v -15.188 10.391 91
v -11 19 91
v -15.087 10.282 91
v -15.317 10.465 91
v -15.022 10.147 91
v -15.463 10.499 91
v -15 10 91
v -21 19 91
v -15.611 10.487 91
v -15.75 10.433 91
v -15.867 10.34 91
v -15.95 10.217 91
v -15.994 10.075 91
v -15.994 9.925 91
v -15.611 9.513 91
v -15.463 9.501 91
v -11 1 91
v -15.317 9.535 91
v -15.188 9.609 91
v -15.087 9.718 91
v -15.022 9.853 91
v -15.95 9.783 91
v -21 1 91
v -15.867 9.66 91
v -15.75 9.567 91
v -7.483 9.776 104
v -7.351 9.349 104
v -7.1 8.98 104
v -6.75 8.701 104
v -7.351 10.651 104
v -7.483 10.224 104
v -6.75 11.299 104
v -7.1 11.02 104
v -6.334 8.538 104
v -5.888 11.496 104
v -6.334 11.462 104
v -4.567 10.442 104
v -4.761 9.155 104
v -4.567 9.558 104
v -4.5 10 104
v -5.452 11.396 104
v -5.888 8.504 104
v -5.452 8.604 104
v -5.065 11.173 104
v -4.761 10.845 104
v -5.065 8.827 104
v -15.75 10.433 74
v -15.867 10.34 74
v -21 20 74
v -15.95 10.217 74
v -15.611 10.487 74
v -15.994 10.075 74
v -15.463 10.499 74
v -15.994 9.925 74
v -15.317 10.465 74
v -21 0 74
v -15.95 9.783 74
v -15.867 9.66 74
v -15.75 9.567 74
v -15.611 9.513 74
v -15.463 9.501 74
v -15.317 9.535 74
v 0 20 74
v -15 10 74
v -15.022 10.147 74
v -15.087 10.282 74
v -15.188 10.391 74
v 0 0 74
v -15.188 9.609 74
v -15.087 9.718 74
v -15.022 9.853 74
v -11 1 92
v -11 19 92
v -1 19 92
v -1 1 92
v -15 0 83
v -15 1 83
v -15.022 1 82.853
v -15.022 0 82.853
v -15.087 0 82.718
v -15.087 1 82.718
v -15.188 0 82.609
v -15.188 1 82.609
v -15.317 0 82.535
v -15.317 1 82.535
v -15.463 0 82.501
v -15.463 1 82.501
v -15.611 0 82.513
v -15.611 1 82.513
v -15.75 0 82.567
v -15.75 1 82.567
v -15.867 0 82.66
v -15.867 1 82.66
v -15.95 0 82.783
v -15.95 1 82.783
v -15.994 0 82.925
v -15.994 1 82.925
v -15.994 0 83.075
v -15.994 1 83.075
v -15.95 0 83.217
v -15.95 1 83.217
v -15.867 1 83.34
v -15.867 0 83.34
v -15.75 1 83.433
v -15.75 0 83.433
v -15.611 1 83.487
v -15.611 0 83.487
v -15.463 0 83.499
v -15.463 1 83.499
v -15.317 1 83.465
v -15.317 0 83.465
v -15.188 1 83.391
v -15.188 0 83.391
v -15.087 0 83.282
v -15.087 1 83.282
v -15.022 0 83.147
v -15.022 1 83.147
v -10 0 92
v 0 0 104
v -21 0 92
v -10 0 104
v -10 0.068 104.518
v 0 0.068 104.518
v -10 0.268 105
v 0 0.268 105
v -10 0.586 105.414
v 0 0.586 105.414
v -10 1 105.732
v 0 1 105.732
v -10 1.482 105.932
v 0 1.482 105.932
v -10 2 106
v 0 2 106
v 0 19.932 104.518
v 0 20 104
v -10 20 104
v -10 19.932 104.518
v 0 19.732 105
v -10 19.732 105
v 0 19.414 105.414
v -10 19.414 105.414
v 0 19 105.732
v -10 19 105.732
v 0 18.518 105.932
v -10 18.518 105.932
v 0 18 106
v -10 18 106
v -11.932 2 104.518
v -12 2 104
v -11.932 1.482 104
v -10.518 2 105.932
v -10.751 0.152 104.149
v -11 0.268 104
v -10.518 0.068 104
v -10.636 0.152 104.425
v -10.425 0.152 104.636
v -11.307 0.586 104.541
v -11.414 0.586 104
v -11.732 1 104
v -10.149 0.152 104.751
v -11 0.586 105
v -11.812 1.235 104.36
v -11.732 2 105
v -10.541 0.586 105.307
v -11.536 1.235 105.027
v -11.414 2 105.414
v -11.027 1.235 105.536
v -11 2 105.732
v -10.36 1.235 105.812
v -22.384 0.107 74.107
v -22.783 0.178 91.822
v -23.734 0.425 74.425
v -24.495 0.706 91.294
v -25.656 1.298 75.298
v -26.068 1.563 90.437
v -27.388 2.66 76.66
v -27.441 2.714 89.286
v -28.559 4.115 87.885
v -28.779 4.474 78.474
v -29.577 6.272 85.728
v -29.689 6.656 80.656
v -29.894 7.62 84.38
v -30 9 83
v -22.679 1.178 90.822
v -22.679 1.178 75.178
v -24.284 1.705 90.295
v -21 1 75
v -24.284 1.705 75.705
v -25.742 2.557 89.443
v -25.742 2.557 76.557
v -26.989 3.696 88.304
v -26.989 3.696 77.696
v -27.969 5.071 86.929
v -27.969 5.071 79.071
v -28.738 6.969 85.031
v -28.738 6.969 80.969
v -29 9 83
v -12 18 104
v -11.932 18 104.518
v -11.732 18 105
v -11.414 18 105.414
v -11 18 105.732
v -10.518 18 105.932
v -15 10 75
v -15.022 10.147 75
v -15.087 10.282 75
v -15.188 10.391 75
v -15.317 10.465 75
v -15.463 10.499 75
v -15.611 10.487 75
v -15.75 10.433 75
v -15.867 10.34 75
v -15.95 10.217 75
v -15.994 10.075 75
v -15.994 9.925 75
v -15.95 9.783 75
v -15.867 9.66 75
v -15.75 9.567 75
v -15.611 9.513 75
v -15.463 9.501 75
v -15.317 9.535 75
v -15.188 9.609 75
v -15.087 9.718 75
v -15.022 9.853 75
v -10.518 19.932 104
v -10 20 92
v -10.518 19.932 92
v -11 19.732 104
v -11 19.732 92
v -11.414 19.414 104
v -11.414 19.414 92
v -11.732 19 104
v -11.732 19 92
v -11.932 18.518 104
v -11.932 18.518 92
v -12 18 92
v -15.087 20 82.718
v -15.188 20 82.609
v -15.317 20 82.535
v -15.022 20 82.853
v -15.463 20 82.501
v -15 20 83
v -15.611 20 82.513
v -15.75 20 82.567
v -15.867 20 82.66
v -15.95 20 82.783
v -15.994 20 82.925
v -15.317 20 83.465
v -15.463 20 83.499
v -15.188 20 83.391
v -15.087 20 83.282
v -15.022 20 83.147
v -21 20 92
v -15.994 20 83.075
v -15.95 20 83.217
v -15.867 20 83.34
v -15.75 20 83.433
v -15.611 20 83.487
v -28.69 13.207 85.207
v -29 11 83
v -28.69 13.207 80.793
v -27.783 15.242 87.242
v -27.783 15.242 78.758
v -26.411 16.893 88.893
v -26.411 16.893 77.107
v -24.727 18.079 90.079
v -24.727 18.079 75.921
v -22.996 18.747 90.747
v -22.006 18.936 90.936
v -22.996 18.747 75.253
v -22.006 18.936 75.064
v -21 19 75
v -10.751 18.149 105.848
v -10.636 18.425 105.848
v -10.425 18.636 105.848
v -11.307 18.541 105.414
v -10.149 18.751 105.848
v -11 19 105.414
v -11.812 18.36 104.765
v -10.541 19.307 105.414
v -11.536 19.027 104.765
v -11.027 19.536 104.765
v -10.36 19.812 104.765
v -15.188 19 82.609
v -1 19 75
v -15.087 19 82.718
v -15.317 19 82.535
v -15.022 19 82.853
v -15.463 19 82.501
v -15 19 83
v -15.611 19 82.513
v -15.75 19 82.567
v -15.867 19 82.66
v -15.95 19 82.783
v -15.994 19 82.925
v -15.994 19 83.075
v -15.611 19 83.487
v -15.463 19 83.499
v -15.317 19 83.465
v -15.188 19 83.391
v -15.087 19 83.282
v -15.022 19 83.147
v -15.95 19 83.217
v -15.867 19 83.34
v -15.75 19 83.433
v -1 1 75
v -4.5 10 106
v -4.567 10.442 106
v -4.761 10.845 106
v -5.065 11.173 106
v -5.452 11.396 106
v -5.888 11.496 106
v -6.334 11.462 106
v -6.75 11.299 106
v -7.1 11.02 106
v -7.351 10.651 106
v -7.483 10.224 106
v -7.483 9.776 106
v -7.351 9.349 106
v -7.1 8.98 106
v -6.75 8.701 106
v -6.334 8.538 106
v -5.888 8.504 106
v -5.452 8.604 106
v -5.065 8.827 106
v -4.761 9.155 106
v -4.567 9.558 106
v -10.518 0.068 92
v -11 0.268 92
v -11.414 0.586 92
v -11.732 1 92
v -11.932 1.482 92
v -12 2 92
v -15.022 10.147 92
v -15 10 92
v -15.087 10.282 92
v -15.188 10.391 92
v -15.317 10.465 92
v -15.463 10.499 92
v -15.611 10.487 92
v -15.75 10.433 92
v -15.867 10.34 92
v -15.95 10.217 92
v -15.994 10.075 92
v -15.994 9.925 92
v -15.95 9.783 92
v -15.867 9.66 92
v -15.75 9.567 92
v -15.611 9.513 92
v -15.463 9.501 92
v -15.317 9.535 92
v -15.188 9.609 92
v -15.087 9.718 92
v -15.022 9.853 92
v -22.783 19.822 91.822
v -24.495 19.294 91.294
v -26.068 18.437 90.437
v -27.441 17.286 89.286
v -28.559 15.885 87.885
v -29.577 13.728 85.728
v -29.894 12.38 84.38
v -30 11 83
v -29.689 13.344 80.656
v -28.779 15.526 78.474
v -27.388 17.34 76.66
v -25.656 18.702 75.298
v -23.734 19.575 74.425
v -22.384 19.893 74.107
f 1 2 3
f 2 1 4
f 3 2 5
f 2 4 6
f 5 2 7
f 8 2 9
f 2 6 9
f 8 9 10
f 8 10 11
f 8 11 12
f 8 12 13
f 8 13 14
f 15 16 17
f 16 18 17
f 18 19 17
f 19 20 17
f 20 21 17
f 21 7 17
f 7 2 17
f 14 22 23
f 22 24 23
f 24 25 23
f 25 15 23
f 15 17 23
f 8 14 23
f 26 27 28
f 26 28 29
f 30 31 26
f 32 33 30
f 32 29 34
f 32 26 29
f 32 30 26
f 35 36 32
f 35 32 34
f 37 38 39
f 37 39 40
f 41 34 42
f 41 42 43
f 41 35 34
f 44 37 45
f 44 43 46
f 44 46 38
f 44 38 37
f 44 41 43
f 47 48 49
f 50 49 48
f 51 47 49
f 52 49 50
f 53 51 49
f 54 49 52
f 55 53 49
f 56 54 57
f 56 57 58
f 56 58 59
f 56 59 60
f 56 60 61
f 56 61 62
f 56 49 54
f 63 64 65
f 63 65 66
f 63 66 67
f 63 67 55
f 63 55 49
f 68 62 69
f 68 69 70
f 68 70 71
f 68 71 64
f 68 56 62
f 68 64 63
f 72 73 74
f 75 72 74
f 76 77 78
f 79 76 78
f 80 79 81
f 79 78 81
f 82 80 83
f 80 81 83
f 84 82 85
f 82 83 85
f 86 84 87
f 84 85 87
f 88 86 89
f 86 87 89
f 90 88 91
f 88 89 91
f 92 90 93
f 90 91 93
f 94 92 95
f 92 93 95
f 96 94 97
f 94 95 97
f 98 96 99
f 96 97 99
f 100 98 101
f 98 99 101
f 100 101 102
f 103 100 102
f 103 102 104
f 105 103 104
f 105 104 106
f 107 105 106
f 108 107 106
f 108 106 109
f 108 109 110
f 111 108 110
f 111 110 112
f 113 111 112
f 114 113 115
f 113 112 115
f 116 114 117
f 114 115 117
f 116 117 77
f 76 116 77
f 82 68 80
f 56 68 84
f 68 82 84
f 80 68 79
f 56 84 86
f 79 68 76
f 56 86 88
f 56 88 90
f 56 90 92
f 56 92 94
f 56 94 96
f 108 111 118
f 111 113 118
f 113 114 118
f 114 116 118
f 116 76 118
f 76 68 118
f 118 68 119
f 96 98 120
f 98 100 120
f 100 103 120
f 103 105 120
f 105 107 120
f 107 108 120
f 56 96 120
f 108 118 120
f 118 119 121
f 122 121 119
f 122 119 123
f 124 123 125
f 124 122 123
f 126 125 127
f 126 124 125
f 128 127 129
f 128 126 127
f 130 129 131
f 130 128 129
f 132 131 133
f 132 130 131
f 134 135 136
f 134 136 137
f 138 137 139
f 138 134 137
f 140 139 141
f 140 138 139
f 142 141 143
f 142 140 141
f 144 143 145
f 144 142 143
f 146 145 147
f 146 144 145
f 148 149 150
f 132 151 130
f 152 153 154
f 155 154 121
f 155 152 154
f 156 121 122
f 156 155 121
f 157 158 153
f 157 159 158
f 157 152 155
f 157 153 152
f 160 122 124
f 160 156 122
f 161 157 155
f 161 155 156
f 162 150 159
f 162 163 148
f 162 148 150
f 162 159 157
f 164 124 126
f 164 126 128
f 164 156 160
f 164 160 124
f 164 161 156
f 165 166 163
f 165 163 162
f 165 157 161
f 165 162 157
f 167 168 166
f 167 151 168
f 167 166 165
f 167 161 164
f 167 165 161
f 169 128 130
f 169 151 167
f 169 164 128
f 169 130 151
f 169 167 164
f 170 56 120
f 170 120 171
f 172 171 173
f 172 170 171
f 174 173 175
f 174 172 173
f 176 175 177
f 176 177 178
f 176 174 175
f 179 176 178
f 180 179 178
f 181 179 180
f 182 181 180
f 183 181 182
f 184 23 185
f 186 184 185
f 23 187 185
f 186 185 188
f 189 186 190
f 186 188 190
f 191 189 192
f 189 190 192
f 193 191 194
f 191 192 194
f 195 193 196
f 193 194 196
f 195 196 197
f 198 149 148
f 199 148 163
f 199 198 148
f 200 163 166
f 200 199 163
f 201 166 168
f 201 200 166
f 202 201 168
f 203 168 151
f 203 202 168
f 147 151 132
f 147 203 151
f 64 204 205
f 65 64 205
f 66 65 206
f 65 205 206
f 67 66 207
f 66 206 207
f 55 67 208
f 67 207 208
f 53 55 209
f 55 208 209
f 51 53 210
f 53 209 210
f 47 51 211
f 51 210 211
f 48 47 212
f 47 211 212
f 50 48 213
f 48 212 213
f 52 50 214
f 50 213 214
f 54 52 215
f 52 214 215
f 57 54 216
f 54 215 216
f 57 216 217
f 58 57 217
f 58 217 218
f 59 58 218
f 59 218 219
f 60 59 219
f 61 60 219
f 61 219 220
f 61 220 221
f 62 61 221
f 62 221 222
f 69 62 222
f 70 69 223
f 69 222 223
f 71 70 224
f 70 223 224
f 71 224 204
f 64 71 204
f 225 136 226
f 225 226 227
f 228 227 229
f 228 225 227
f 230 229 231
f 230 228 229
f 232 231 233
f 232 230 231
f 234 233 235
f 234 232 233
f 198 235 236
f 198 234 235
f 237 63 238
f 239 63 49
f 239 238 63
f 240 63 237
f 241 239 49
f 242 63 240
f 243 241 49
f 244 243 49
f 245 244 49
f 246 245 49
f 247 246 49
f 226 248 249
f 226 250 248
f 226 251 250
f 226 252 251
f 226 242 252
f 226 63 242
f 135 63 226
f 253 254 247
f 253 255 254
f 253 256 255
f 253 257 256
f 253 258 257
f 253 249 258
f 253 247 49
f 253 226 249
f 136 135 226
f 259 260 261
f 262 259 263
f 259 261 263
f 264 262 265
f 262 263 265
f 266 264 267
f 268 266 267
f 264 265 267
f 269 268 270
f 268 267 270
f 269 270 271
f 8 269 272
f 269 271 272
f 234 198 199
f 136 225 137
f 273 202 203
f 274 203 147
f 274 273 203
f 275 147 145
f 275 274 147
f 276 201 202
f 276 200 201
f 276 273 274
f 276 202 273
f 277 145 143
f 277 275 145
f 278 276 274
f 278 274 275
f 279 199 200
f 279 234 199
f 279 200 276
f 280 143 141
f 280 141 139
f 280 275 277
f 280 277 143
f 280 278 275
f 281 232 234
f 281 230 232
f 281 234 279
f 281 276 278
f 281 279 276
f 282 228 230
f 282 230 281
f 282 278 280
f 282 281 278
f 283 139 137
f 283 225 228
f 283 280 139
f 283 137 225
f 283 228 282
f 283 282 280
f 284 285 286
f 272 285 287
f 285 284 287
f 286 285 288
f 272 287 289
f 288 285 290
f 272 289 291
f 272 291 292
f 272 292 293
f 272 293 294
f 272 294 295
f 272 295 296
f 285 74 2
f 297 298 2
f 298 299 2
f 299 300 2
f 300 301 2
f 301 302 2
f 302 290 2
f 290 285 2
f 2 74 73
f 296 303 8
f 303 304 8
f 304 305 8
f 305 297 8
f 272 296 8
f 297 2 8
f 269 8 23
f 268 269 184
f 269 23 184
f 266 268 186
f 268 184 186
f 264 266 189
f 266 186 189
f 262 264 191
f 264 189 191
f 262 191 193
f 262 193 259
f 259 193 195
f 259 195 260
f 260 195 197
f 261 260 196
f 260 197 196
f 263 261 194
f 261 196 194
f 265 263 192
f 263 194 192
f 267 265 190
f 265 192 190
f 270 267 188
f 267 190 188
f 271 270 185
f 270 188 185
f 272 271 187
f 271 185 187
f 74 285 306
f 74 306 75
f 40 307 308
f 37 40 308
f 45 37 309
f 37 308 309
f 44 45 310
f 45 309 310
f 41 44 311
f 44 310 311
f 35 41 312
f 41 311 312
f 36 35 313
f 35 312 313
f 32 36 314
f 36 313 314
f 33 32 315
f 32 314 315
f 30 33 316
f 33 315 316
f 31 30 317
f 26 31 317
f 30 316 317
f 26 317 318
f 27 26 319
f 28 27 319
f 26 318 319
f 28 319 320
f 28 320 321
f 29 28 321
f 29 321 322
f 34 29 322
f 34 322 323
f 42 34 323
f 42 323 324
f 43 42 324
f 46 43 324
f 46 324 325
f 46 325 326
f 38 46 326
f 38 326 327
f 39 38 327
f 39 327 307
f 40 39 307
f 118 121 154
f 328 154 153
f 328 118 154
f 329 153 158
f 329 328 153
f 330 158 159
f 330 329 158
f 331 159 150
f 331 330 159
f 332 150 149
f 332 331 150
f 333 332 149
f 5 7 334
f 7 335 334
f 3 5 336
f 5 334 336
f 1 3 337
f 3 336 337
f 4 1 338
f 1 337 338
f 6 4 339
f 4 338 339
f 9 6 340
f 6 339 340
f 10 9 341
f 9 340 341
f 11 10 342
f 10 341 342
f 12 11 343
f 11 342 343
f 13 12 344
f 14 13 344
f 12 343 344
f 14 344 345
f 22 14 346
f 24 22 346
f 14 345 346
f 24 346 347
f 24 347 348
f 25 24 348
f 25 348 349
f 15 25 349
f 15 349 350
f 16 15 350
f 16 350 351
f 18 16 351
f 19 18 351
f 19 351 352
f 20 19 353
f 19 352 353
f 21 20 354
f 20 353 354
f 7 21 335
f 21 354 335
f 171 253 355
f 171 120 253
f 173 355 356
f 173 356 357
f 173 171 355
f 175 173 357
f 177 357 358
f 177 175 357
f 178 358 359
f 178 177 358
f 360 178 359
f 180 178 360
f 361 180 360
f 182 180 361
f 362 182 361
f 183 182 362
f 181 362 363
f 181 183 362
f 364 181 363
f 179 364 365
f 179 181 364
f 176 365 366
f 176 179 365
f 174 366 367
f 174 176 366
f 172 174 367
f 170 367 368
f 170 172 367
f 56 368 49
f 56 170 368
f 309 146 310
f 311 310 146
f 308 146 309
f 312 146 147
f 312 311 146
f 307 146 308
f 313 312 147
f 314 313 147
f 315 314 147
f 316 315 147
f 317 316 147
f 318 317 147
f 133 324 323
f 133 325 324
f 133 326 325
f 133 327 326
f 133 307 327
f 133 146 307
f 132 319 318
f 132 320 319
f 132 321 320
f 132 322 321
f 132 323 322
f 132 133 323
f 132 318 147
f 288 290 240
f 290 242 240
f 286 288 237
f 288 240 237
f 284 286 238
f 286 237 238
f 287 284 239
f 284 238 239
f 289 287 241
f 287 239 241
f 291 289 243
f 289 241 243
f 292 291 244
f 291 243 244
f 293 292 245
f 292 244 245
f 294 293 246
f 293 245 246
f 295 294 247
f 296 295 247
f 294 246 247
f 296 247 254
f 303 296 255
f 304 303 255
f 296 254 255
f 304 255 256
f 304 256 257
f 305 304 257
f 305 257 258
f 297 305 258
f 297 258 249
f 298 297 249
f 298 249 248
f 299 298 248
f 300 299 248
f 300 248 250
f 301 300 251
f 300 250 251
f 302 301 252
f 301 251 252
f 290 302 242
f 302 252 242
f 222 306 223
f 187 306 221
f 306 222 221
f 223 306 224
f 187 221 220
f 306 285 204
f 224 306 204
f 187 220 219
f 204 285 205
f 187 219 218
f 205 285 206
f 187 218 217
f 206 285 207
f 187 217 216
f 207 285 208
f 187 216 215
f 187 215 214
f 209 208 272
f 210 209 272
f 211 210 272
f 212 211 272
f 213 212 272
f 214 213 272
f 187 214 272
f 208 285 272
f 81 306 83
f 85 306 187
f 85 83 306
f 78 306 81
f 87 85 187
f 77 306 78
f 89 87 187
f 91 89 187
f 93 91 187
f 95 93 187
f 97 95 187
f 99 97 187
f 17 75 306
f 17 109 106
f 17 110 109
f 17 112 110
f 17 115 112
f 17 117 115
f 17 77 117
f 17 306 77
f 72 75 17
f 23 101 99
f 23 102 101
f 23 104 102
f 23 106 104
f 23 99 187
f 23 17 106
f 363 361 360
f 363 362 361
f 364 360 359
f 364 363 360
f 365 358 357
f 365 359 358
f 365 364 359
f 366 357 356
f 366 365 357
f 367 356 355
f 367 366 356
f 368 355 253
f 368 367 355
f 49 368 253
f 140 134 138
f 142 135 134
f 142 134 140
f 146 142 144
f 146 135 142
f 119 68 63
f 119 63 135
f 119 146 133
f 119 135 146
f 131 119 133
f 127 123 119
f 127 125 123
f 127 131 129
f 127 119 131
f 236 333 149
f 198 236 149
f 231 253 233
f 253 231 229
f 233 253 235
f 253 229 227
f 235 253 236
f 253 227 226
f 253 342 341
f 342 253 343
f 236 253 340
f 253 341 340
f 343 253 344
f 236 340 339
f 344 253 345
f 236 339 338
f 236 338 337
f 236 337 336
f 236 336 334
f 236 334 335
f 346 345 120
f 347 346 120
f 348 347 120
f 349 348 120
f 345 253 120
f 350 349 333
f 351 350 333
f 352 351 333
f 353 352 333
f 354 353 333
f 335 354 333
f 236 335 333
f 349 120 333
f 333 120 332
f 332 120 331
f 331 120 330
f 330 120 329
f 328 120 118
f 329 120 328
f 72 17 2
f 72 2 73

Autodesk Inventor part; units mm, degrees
ref_plane "YZ Plane" through (0, 0, 0) normal (1, 0, 0) x (0, 1, 0)
sketch "Sketch1" plane through (0, 0, 0) normal (0, 1, 0) x (-1, 0, 0)
  line L0 (0, -106) -> (0, 94)
  line L1 (0, -106) -> (21, -106) construction
  line L2 (30, -97) -> (30, -97) construction
  line L3 (0, -106) -> (12, -106) construction
  line L4 (21, -88) -> (12, -88) construction
  line L5 (12, -88) -> (12, -86)
  line L6 (12, -106) -> (21, -106)
  line L7 (30, -88) -> (21, -88) construction
  line L8 (30, -88) -> (30, -106) construction
  arc A0 (21, -106) -> (30, -97) centre (21, -97) ccw
  arc A1 (30, -97) -> (21, -88) centre (21, -97) ccw
  line L9 (21, -106) -> (30, -106) construction
  line L10 (21, -88) -> (12, -88)
  line L11 (12, -68) -> (12, -66)
  arc A2 (21, -86) -> (30, -77) centre (21, -77) ccw
  arc A3 (30, -77) -> (21, -68) centre (21, -77) ccw
  line L12 (0, -86) -> (21, -86) construction
  line L13 (21, -68) -> (12, -68) construction
  line L14 (21, -68) -> (12, -68)
  line L15 (12, -86) -> (21, -86)
  line L16 (12, -48) -> (12, -46)
  arc A4 (21, -66) -> (30, -57) centre (21, -57) ccw
  arc A5 (30, -57) -> (21, -48) centre (21, -57) ccw
  line L17 (0, -66) -> (21, -66) construction
  line L18 (21, -48) -> (12, -48) construction
  line L19 (21, -48) -> (12, -48)
  line L20 (12, -66) -> (21, -66)
  line L21 (12, -28) -> (12, -26)
  arc A6 (21, -46) -> (30, -37) centre (21, -37) ccw
  arc A7 (30, -37) -> (21, -28) centre (21, -37) ccw
  line L22 (0, -46) -> (21, -46) construction
  line L23 (21, -28) -> (12, -28) construction
  line L24 (21, -28) -> (12, -28)
  line L25 (12, -46) -> (21, -46)
  line L26 (12, -8) -> (12, -6)
  arc A8 (21, -26) -> (30, -17) centre (21, -17) ccw
  arc A9 (30, -17) -> (21, -8) centre (21, -17) ccw
  line L27 (0, -26) -> (21, -26) construction
  line L28 (21, -8) -> (12, -8) construction
  line L29 (21, -8) -> (12, -8)
  line L30 (12, -26) -> (21, -26)
  line L31 (12, 12) -> (12, 14)
  arc A10 (21, -6) -> (30, 3) centre (21, 3) ccw
  arc A11 (30, 3) -> (21, 12) centre (21, 3) ccw
  line L32 (0, -6) -> (21, -6) construction
  line L33 (21, 12) -> (12, 12) construction
  line L34 (21, 12) -> (12, 12)
  line L35 (12, -6) -> (21, -6)
  line L36 (12, 32) -> (12, 34)
  arc A12 (21, 14) -> (30, 23) centre (21, 23) ccw
  arc A13 (30, 23) -> (21, 32) centre (21, 23) ccw
  line L37 (0, 14) -> (21, 14) construction
  line L38 (21, 32) -> (12, 32) construction
  line L39 (21, 32) -> (12, 32)
  line L40 (12, 14) -> (21, 14)
  line L41 (12, 52) -> (12, 54)
  arc A14 (21, 34) -> (30, 43) centre (21, 43) ccw
  arc A15 (30, 43) -> (21, 52) centre (21, 43) ccw
  line L42 (0, 34) -> (21, 34) construction
  line L43 (21, 52) -> (12, 52) construction
  line L44 (21, 52) -> (12, 52)
  line L45 (12, 34) -> (21, 34)
  line L46 (12, 72) -> (12, 74)
  arc A16 (21, 54) -> (30, 63) centre (21, 63) ccw
  arc A17 (30, 63) -> (21, 72) centre (21, 63) ccw
  line L47 (0, 54) -> (21, 54) construction
  line L48 (21, 72) -> (12, 72) construction
  line L49 (21, 72) -> (12, 72)
  line L50 (12, 54) -> (21, 54)
  line L51 (12, 92) -> (12, 94)
  arc A18 (21, 74) -> (30, 83) centre (21, 83) ccw
  arc A19 (30, 83) -> (21, 92) centre (21, 83) ccw
  line L52 (0, 74) -> (21, 74) construction
  line L53 (21, 92) -> (12, 92) construction
  line L54 (21, 92) -> (12, 92)
  line L55 (12, 74) -> (21, 74)
  line L56 (0, 94) -> (0, 106)
  line L57 (0, 106) -> (6, 106)
  line L58 (12, 100) -> (12, 94)
  line L59 (12, -106) -> (0, -106)
  line L60 (12, 100) -> (12, 106)
  line L61 (12, 106) -> (6, 106)
  line L62 (0, -106) -> (64, -106)
  line L63 (64, -106) -> (64, 74)
  line L64 (64, 74) -> (0, 74)
  line L65 (0, 74) -> (0, -106)
  point P0 (0, 0)
  point P1 (30, -86)
  point P2 (30, -68)
  point P3 (30, -66)
  point P4 (30, -48)
  point P5 (30, -46)
  point P6 (30, -28)
  point P7 (30, -26)
  point P8 (30, -8)
  point P9 (30, -6)
  point P10 (30, 12)
  point P11 (30, 14)
  point P12 (30, 32)
  point P13 (30, 34)
  point P14 (30, 52)
  point P15 (30, 54)
  point P16 (30, 72)
  point P17 (30, 74)
  point P18 (30, 92)
  point P19 (30, -97)
  point P20 (21, 74)
  point P21 (0, 74)
  dimension "d0" = 94
  dimension "d1" = 110.1635
  dimension "d2" = 18
  dimension "d3" = 106.6771
  dimension "d4" = 2
  dimension "d5" = 9
  dimension "d6" = 9
  dimension "d11" = 20
  dimension "d16" = 12
  dimension "d17" = 12
  dimension "d60" = 64
extrude "Extrusion1" add sketch "Sketch1" along normal blind 20 contours L0 L64 L46 L49 A17 A16 L50 L41 L44 A15 A14 L45 L36 L39 A13 A12 L40 L31 L34 A11 A10 L35 L26 L29 A9 A8 L30 L21 L24 A7 A6 L25 L16 L19 A5 A4 L20 L11 L14 A3 A2 L15 L5 L10 A1 A0 L6 L59 | L0 L56 L57 L61 L60 L58 L51 L54 A19 A18 L55 L64
sketch "Sketch2" plane through (0, 0, -106) normal (0, 0, -1) x (-1, 0, 0)
  line L0 (30, 20) -> (21, 20) construction
  line L1 (21, 20) -> (0, 20)
  line L2 (0, 20) -> (0, 0)
  line L3 (0, 0) -> (21, 0)
  line L4 (30, 9) -> (30, 11)
  line L5 (30, 20) -> (0, 0) construction
  arc A0 (30, 11) -> (21, 20) centre (21, 11) ccw
  arc A1 (21, 0) -> (30, 9) centre (21, 9) ccw
  line L6 (5.5, -4) -> (24.5, -4)
  line L7 (24.5, -4) -> (24.5, 24)
  line L8 (24.5, 24) -> (5.5, 24)
  line L9 (5.5, 24) -> (5.5, -4)
  line L10 (5.5, -4) -> (24.5, 24) construction
  line L11 (24.5, -4) -> (5.5, 24) construction
  line L12 (24.5, 24) -> (37.5, 24)
  line L13 (37.5, 24) -> (37.5, 0)
  line L14 (37.5, 0) -> (24.5, -4)
  point P0 (0, 0)
  point P1 (30, 0)
  point P2 (15, 10)
  point P3 (5.5, 0)
  point P4 (5.5, 20)
  dimension "d21" = 30
  dimension "d22" = 20
  dimension "d23" = 9
  dimension "d24" = 9
  dimension "d25" = 19
  dimension "d26" = 28
  dimension "d65" = 13
extrude "Extrusion2" cut sketch "Sketch2" against normal blind 200 contours L1 L9 L8 L7 A0 | L7 L12 L13 L14 A1 L4 A0 | L3 A1 L7 L6 L9
shell "Shell2" thickness 1 removed faces 1 at (-8, 6.6667, 106)
sketch "Sketch7" plane through (-12, 0, 106) normal (0, 0, 1) x (1, 0, 0)
  line L0 (0, 20) -> (12, 20) projected
  line L1 (0, 0) -> (12, 0)
  line L2 (12, 0) -> (12, 20)
  line L3 (12, 20) -> (0, 20)
  line L4 (0, 20) -> (0, 0)
  circle A0 centre (6, 10) radius 1.5
  point P0 (12, 0)
  dimension "d46" = 3
  dimension "d66" = 6
  dimension "d67" = 10
extrude "Extrusion5" add sketch "Sketch7" against normal blind 14 contours L0 L2 L1 L4 | A0
fillet "Fillet2" radius 2 5 edges at (-12, 20, 99) (-12, 10, 106) (-12, 0, 99) (-6, 0, 106) (-6, 20, 106)
extrude "Extrusion6" cut sketch "Sketch7" against normal blind 2 contours A0
sketch "Sketch8" plane through (0, 0, 0) normal (1, 0, 0) x (0, 1, 0)
  line L0 (0, -88) -> (20, -88) projected
  line L1 (0, -86) -> (20, -86) projected
  line L2 (0, 9) -> (20, 9)
  line L3 (20, 9) -> (20, 10)
  line L4 (20, 10) -> (0, 10)
  line L5 (0, 10) -> (0, 9)
  line L6 (0, 19) -> (20, 19)
  line L7 (20, 20) -> (0, 20)
  line L8 (20, 19) -> (20, 20)
  line L9 (0, 20) -> (0, 19)
  line L10 (0, 29) -> (20, 29)
  line L11 (20, 30) -> (0, 30)
  line L12 (20, 29) -> (20, 30)
  line L13 (0, 30) -> (0, 29)
  line L14 (0, 39) -> (20, 39)
  line L15 (20, 40) -> (0, 40)
  line L16 (20, 39) -> (20, 40)
  line L17 (0, 40) -> (0, 39)
  line L18 (0, 49) -> (20, 49)
  line L19 (20, 50) -> (0, 50)
  line L20 (20, 49) -> (20, 50)
  line L21 (0, 50) -> (0, 49)
  line L22 (0, 59) -> (20, 59)
  line L23 (20, 60) -> (0, 60)
  line L24 (20, 59) -> (20, 60)
  line L25 (0, 60) -> (0, 59)
  line L26 (0, 69) -> (20, 69)
  line L27 (20, 70) -> (0, 70)
  line L28 (20, 69) -> (20, 70)
  line L29 (0, 70) -> (0, 69)
  line L30 (0, 79) -> (20, 79)
  line L31 (20, 80) -> (0, 80)
  line L32 (20, 79) -> (20, 80)
  line L33 (0, 80) -> (0, 79)
  line L34 (0, 89) -> (20, 89)
  line L35 (20, 90) -> (0, 90)
  line L36 (20, 89) -> (20, 90)
  line L37 (0, 90) -> (0, 89)
  point P0 (0, 0)
  dimension "d51" = 10
extrude "Extrusion7" [suppressed]
ref_plane "Work Plane1" through (-21, 0, 91.5) normal (0, 0, 1) x (1, 0, 0)
sketch "Sketch4" plane through (-21, 0, 91.5) normal (0, 0, 1) x (1, 0, 0)
  line L0 (0, 0) -> (0, 20) projected
  line L1 (0, 0) -> (12, 20) construction
  circle A0 centre (6, 10) radius 2 construction
  line L2 (5, 6.5) -> (1, 6.5)
  line L3 (1, 6.5) -> (1, 13.5)
  line L4 (1, 13.5) -> (5, 13.5)
  line L5 (5, 13.5) -> (5, 6.5)
  line L6 (5, 6.5) -> (1, 13.5) construction
  line L7 (1, 6.5) -> (5, 13.5) construction
  point P0 (21, 0)
  point P1 (3, 10)
  point P2 (1, 10)
  point P3 (5, 8.2679)
  dimension "d31" = 4
  dimension "d58" = 4
  dimension "d59" = 7
extrude "Extrusion3" [suppressed]
extrude "Extrusion8" cut sketch "Sketch1" along normal blind 20 contours L0 L64 L46 L49 A17 A16 L50 L41 L44 A15 A14 L45 L36 L39 A13 A12 L40 L31 L34 A11 A10 L35 L26 L29 A9 A8 L30 L21 L24 A7 A6 L25 L16 L19 A5 A4 L20 L11 L14 A3 A2 L15 L5 L10 A1 A0 L6 L59 | L55 L64 L63 L62 A0 A1 L10 L5 L15 A2 A3 L14 L11 L20 A4 A5 L19 L16 L25 A6 A7 L24 L21 L30 A8 A9 L29 L26 L35 A10 A11 L34 L31 L40 A12 A13 L39 L36 L45 A14 A15 L44 L41 L50 A16 A17 L49 L46
sketch "Sketch9" plane through (0, 0, 74) normal (0, 0, -1) x (-1, 0, 0)
  line L0 (11, 19) -> (1, 19) projected
  line L1 (11, 19) -> (0, 19)
  line L2 (0, 19) -> (0, 0)
  line L3 (0, 0) -> (11, 0)
  line L4 (11, 0) -> (11, 19)
extrude "Extrusion9" add sketch "Sketch9" against normal blind 1
ref_plane "Work Plane2" through (0, 10, 0) normal (0, 1, 0) x (-1, 0, 0)
sketch "Sketch10" plane through (0, 20, 0) normal (0, 1, 0) x (1, 0, 0)
  line L0 (-10, -104) -> (-10, -92) construction
  line L1 (-21, -92) -> (-21, -74) construction
  line L2 (-10, -92) -> (-21, -74) construction
  circle A0 centre (-15.5, -83) radius 0.5
  point P0 (0, 0)
  dimension "d68" = 1
extrude "Extrusion10" cut sketch "Sketch10" against normal through all
sketch "Sketch11" plane through (-21, 0, 92) normal (0, 0, 1) x (1, 0, 0)
  line L0 (0, 0) -> (11, 0) construction
  line L1 (11, 18) -> (11, 20) construction
  line L2 (0, 0) -> (11, 20) construction
  circle A0 centre (5.5, 10) radius 0.5
  point P0 (21, 0)
  dimension "d71" = 1
extrude "Extrusion11" cut sketch "Sketch11" against normal through all
sketch "Sketch6" plane through (0, 10, 0) normal (0, 1, 0) x (-1, 0, 0)
  line L0 (40.7593, 109.726) -> (-19.2407, 109.726)
  line L1 (-19.2407, 109.726) -> (-19.2407, -3.5286)
  line L2 (-19.2407, -3.5286) -> (40.7593, -3.5286)
  line L3 (40.7593, -3.5286) -> (40.7593, 109.726)
  point P0 (0, 0)
  dimension "d36" = 113.2546
  dimension "d37" = 60
properties part number "3D_print_actuator"
